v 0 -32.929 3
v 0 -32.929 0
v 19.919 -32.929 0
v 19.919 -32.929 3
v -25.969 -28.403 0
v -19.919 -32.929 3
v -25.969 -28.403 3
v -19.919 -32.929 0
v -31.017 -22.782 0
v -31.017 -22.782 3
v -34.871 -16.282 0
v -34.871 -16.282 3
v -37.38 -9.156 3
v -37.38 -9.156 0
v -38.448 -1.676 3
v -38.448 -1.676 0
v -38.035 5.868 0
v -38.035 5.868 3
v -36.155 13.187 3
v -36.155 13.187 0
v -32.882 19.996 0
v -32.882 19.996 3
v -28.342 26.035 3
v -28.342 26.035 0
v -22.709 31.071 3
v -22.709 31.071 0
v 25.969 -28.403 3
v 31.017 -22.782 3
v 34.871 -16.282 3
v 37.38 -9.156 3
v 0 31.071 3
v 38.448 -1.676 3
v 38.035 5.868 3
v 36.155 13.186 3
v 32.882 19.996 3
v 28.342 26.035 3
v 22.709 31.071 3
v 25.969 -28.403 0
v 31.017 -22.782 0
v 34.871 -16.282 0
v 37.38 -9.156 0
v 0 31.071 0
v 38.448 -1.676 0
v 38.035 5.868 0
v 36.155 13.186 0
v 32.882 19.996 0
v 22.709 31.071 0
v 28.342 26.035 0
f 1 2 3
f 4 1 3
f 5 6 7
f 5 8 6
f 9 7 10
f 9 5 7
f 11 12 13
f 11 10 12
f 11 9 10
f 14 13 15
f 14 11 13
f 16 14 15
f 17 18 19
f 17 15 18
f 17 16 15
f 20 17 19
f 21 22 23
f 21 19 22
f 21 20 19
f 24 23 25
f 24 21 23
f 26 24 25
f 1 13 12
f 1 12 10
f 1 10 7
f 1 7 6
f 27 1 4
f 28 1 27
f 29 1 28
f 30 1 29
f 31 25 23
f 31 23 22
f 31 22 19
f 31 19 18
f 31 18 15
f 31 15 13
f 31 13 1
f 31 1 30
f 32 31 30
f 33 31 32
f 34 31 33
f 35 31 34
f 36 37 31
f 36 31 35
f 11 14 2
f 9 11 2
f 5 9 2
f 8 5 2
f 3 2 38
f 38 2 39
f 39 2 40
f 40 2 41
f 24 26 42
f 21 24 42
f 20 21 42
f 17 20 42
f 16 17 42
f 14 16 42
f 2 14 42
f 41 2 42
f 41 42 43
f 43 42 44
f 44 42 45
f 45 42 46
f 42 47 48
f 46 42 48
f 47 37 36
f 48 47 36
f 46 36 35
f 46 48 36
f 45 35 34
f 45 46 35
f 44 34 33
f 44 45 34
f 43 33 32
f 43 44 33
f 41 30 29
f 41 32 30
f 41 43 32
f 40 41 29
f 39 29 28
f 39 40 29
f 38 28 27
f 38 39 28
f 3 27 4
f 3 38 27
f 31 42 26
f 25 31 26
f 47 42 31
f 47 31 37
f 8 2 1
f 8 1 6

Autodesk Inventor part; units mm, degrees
ref_plane "YZ Plane" through (0, 0, 0) normal (1, 0, 0) x (0, 1, 0)
ref_plane "XZ Plane" through (0, 0, 0) normal (0, 1, 0) x (-1, 0, 0)
ref_plane "XY Plane" through (0, 0, 0) normal (0, 0, 1) x (1, 0, 0)
sketch "Sketch1" plane through (0, 0, 0) normal (0, 0, 1) x (1, 0, 0)
  line L0 (0, 31.071) -> (22.7086, 31.071)
  line L1 (0, 31.071) -> (-22.7086, 31.071)
  line L2 (0, -32.929) -> (19.9189, -32.929)
  line L3 (0, -32.929) -> (-19.9189, -32.929)
  arc A0 (-22.7086, 31.071) -> (-19.9189, -32.929) centre (0, 0) ccw
  arc A1 (19.9189, -32.929) -> (22.7086, 31.071) centre (0, 0) ccw
  dimension "d2" = 64
extrude "Extrusion1" add sketch "Sketch1" along normal blind 3
properties part number "superior"
